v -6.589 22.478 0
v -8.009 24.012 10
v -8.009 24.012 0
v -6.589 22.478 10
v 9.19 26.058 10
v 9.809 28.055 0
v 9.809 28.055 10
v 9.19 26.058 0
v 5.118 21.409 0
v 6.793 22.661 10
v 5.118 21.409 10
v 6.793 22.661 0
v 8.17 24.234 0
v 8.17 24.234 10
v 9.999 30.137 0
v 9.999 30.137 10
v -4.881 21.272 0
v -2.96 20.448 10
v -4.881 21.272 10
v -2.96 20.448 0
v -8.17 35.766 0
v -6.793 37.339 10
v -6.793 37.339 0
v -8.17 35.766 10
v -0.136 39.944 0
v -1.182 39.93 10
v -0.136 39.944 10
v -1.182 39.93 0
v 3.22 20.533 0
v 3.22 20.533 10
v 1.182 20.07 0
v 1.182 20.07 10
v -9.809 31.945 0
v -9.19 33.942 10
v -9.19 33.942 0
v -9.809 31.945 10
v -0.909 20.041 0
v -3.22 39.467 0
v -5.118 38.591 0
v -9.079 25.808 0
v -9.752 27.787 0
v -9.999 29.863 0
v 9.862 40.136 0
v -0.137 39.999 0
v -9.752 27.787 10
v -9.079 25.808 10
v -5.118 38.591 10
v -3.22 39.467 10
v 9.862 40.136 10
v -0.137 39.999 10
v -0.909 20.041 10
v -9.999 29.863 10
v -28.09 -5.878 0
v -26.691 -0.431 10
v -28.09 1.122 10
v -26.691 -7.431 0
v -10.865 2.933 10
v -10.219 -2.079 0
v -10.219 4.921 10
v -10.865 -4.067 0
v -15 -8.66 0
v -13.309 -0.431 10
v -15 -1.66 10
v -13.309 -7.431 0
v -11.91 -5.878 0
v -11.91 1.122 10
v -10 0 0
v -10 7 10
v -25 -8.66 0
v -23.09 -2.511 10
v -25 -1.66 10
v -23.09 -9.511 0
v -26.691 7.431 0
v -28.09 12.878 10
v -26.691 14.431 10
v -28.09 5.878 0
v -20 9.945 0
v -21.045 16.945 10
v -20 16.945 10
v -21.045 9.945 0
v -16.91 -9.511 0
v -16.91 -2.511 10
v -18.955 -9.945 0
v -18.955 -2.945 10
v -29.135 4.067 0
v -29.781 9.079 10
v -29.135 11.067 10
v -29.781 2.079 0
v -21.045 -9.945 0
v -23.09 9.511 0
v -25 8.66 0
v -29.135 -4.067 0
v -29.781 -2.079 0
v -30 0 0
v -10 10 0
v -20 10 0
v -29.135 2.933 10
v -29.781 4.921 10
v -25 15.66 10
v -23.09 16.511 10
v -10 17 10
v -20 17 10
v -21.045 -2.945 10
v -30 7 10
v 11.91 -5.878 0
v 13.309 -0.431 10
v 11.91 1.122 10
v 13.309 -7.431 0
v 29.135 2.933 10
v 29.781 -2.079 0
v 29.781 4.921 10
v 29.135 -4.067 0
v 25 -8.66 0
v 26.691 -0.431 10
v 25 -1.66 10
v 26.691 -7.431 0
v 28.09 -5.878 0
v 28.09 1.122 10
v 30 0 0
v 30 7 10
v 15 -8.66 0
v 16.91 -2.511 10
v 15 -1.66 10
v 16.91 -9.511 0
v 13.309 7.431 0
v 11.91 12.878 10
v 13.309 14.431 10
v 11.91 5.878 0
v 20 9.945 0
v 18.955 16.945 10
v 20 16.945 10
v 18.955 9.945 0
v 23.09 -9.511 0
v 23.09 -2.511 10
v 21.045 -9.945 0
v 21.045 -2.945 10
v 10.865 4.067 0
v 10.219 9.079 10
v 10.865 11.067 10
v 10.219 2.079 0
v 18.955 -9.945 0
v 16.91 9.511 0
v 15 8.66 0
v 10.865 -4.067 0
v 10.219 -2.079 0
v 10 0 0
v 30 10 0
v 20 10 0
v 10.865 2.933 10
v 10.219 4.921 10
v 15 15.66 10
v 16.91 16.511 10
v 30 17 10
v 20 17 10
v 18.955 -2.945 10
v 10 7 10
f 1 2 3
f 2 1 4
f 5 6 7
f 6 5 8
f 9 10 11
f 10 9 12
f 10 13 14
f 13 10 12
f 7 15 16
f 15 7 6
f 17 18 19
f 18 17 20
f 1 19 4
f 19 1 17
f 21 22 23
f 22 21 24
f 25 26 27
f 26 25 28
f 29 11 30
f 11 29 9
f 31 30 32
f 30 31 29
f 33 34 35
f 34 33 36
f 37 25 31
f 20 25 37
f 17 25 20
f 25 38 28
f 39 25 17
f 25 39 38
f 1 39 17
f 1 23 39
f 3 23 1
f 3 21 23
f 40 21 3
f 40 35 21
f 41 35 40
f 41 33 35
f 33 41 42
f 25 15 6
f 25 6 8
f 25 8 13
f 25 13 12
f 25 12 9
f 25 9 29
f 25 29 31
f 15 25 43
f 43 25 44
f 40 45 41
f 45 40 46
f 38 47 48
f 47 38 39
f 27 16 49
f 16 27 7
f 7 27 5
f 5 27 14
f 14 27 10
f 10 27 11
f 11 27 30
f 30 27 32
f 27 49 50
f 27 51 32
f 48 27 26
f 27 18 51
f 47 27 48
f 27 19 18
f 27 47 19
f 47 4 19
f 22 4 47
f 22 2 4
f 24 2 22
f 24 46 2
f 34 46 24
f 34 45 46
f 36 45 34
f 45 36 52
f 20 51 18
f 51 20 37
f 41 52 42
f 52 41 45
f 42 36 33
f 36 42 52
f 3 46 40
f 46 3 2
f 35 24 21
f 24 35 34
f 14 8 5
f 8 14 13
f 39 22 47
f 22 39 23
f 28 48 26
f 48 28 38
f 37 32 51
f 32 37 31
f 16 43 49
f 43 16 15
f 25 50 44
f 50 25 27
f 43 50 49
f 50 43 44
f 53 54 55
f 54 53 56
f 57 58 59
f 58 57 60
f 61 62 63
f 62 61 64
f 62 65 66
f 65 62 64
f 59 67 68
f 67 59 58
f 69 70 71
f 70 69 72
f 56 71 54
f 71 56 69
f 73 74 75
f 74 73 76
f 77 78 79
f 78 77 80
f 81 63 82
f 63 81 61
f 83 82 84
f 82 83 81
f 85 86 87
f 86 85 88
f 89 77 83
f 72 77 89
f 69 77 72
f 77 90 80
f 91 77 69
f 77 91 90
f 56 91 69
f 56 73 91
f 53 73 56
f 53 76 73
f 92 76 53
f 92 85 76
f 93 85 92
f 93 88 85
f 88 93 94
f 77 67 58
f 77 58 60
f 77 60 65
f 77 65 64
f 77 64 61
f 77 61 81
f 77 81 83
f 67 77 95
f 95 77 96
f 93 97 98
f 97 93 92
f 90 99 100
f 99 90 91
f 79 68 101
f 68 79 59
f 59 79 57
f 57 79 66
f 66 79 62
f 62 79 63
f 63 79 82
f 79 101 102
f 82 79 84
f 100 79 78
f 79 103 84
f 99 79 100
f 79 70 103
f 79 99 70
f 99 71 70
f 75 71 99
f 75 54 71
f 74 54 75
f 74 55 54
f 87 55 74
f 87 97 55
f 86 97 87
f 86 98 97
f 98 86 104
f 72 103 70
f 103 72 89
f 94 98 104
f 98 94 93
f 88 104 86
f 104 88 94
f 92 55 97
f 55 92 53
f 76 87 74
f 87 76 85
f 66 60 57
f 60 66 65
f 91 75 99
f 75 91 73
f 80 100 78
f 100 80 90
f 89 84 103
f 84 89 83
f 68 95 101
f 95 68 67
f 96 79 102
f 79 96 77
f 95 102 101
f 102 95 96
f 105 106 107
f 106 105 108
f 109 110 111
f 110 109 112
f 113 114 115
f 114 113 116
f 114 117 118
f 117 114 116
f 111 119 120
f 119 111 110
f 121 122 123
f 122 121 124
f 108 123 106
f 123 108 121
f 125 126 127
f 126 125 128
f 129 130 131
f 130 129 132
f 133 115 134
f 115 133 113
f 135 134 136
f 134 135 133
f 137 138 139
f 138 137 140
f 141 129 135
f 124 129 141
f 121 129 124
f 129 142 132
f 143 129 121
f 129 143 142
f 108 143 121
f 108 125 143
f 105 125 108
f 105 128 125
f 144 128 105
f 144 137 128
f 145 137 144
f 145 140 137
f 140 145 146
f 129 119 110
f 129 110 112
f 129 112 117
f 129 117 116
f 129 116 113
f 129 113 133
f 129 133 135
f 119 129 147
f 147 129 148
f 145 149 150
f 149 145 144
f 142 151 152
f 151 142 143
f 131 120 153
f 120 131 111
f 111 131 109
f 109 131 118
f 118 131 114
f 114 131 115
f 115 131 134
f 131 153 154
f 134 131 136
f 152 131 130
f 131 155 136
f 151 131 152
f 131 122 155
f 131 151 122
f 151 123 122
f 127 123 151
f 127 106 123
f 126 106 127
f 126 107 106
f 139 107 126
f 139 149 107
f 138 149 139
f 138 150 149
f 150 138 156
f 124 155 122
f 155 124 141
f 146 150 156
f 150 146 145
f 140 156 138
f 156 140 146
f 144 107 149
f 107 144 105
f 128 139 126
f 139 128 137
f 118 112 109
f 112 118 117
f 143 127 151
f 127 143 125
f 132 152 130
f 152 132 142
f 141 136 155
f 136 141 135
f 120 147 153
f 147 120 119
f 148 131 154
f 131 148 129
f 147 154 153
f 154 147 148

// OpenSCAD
// Examples from
// https://en.wikibooks.org/wiki/OpenSCAD_User_Manual/Transformations#multmatrix
// CC-BY-SA 3.0 https://creativecommons.org/licenses/by-sa/3.0/

angle=PI/4;
multmatrix(m = [ [cos(angle), -sin(angle), 0,  0],
                 [sin(angle),  cos(angle), 0, 30],
                 [         0,           0, 1,  0],
                 [         0,           0, 0,  1]
               ] )
union() {
   cylinder(r=10.0,h=10,center=false);
   cube(size=[10,10,10],center=false);
}

// skew
M = [ [ 1  , 0  , 0  , 0   ],
      [ 0  , 1  , 0.7, 0   ],  // The "0.7" is the skew value; pushed along the y axis as z changes.
      [ 0  , 0  , 1  , 0   ],
      [ 0  , 0  , 0  , 1   ] ] ;
translate([-20,0,0])
multmatrix(M) {  union() {
    cylinder(r=10.0,h=10,center=false);
    cube(size=[10,10,10],center=false);
} }

// same as previous example but using 3x4 matrix
N = [ [ 1  , 0  , 0  , 0   ],
      [ 0  , 1  , 0.7, 0   ],  // The "0.7" is the skew value; pushed along the y axis as z changes.
      [ 0  , 0  , 1  , 0   ] ] ;
translate([20,0,0])
multmatrix(N) {  union() {
    cylinder(r=10.0,h=10,center=false);
    cube(size=[10,10,10],center=false);
} }
